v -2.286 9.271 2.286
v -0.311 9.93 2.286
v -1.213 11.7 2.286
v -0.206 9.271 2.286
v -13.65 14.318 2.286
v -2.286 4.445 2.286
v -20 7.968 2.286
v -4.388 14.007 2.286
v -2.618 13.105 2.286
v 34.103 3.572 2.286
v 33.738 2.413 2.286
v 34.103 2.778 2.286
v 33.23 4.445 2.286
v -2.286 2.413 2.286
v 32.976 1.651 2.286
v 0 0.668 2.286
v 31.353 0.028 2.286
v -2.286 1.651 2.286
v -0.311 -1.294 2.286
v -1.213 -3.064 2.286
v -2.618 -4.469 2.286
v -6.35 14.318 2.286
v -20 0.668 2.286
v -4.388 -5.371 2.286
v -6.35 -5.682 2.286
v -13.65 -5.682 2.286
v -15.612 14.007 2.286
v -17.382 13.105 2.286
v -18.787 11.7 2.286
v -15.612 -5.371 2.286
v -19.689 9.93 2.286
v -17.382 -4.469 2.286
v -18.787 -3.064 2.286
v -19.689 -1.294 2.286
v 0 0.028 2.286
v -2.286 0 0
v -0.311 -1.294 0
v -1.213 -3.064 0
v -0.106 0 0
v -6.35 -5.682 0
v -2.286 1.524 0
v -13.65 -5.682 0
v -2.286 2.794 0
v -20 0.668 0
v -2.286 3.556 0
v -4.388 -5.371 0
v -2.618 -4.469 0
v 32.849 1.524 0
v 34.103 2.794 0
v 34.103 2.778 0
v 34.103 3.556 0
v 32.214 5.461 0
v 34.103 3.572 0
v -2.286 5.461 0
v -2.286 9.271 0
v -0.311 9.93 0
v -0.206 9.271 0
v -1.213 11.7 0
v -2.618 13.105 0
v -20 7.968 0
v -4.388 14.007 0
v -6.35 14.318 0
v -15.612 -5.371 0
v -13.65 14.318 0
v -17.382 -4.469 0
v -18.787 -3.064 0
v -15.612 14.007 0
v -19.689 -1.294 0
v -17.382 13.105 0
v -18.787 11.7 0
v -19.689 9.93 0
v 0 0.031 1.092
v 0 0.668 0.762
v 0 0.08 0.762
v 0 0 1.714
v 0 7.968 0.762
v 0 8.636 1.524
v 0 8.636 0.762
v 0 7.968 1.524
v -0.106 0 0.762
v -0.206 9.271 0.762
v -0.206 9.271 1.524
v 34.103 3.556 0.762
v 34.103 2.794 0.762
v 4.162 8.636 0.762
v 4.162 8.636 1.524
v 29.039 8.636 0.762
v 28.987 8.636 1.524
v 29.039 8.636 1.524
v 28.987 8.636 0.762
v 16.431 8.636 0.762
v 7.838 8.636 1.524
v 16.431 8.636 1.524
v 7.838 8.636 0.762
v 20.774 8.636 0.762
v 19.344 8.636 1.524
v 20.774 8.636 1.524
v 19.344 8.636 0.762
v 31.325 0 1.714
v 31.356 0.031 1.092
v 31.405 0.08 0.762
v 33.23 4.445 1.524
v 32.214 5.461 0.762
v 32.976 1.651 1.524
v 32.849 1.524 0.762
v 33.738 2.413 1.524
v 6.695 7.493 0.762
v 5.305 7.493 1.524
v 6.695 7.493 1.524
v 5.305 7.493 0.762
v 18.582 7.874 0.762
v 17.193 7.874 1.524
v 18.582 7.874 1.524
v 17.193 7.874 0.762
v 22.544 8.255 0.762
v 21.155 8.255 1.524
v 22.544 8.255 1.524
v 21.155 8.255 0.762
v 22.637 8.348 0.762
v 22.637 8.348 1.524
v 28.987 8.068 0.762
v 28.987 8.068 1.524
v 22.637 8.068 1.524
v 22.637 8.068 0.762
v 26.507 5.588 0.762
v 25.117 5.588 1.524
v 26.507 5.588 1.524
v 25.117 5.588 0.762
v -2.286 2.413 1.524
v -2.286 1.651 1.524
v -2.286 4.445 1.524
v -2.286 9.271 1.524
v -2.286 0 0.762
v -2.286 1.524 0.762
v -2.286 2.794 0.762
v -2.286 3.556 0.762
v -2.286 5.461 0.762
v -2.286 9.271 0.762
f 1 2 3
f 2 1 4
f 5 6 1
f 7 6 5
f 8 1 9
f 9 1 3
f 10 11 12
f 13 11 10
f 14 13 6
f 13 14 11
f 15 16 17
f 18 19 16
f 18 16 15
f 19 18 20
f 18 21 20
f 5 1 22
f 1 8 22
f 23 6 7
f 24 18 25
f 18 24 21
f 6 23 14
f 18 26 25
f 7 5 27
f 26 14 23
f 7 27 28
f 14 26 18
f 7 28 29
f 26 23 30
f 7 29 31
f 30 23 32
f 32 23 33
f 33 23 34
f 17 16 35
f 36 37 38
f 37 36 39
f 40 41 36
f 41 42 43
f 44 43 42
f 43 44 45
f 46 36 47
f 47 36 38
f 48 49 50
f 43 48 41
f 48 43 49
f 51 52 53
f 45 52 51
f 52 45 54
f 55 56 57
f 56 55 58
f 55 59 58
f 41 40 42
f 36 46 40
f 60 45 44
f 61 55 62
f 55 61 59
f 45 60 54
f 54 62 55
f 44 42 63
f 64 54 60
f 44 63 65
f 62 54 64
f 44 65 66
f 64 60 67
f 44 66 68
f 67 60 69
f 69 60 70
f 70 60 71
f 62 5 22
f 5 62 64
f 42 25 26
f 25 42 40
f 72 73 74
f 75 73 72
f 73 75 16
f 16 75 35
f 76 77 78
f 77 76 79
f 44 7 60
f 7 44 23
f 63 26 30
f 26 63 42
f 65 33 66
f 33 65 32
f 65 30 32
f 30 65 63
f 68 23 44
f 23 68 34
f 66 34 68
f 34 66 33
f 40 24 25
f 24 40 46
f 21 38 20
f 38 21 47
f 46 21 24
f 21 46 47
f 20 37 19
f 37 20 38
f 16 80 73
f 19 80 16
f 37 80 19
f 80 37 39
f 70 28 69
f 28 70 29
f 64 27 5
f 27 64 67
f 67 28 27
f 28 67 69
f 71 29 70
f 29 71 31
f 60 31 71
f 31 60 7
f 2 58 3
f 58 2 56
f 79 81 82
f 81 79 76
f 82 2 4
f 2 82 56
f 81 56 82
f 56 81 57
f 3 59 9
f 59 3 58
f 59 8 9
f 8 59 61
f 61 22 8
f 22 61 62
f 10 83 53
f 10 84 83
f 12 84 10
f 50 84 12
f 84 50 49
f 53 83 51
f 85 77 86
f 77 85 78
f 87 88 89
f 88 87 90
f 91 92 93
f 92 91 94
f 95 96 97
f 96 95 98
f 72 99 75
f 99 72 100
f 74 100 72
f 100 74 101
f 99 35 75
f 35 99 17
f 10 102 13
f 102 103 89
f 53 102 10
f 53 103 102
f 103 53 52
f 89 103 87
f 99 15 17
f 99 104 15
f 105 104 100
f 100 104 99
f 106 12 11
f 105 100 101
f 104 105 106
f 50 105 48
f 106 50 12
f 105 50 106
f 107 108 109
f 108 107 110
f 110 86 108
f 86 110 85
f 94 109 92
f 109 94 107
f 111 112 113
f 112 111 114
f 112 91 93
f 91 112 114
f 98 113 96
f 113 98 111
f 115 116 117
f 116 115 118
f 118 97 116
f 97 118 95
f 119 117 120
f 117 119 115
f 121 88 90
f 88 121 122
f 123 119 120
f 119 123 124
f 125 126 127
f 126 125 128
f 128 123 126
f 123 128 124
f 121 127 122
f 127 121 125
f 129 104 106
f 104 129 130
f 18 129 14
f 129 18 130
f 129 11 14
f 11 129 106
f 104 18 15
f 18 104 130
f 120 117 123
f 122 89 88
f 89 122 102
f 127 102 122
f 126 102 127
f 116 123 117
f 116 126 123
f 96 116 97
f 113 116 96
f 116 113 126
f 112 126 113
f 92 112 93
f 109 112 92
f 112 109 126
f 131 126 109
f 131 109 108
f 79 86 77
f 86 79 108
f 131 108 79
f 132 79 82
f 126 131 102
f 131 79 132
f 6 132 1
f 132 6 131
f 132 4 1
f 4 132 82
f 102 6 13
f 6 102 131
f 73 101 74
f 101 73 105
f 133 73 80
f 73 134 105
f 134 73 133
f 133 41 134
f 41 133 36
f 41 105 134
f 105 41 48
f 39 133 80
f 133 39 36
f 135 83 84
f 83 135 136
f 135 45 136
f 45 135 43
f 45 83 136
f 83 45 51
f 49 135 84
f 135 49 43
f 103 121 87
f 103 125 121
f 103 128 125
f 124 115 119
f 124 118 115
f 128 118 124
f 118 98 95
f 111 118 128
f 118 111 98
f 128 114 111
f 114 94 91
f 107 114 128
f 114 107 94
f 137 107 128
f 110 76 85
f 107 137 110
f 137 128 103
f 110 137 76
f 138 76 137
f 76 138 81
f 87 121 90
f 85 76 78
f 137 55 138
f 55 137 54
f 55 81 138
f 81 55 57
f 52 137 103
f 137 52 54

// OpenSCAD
//Pin reference Table
//0 = .300"
//1 = .285
//2 = .270
//3 = .255"
//4 = .240"
//5 = .225"
//6 = .210"
//7 = .195"
//8 = .180"
//9 = .165" 
//10 = .150"
//cuts are ordered the same as key codes
//(cut at the handle of key)
cut_1 = 3; //[0:10]
cut_2 = 0; //[0:10]
cut_3 = 0; //[0:10]
cut_4 = 2; //[0:10]
cut_5 = 1; //[0:10]
cut_6 = 8; //[0:10]
//(cut at the tip of key)


function mm(i) = i*25.4;

module handle(size, r) {
  union() {
    translate([r, 0, 0]) cube([size[0]-2*r, size[1], size[2]]);
    translate([0, r, 0]) cube([size[0], size[1]-2*r, size[2]]);
    translate([r, r, 0]) cylinder(h=size[2], r=r);
    translate([size[0]-r, r, 0]) cylinder(h=size[2], r=r);
    translate([r, size[1]-r, 0]) cylinder(h=size[2], r=r);
    translate([size[0]-r, size[1]-r, 0]) cylinder(h=size[2], r=r);
  }
}

module bit() {
  w = mm(1/4);
  difference() {
    translate([-w/2, 0, 0]) cube([w, mm(1), w]);
    translate([-mm(7/256), 0, 0]) rotate([0, 0, 135]) cube([w, w, w]);
    translate([mm(7/256), 0, 0]) rotate([0, 0, -45]) cube([w, w, w]);
  }
}

// Lockwood gen6t 6 pin key.  The measurements are mostly guesses based on reverse
// engineering some keys I have and some publicly available information.
module gen6t(bits) {
  // You may need to adjust these to fit your specific printer settings
  thickness = mm(0.090);//Done
  length = 34.5; //Done
  width = mm(.340); //Done
  
  shoulder = 6;	//Done
  pin_spacing = mm(.156); //Done
  depth_inc = mm(.015); //Done
  
  // Handle size
  h_l = 20;
  h_w = 20;
  difference() {
    // blade and key handle
    union() {
      translate([-h_l, -h_w/2 + width/2, 0]) handle([h_l, h_w, thickness], mm(1/4));
      intersection() {
        // cut a little off the tip to avoid going too long
        cube([length - mm(1/64), width, thickness]);
        translate([0, mm(1/4), thickness*3/4]) rotate([0, 90, 0]) cylinder(h=length, r=mm(1/4), $fn=64);
      }
    }
    
    // chamfer the tip
    translate([length, mm(1/8), 0]) {
      rotate([0, 0, 45]) cube([10, 10, thickness]);
      rotate([0, 0, 225]) cube([10, 10, thickness]);
    }


    // cut the channels in the key.  designed more for printability than accuracy
    //Side A 
    translate([-thickness, mm(0.065), (thickness * 2)/3]) cube([length + thickness, mm(0.030), thickness/3]); 
    translate([-thickness, mm(0.175), (thickness * 2)/3]) cube([length + thickness, mm(0.190), thickness/3]);  
    //translate([-thickness, 4, thickness])rotate([-30,0,0]) cube([length + thickness, 2.5, thickness-0.75]);
    //translate([-thickness, 6, 0.75]) cube([length + thickness, 4, thickness-0.75]);
    
    //Side B
    translate([-thickness, 0, 0]) cube([length + thickness, mm(0.060), thickness/3]);
    translate([-thickness, mm(0.110), 0]) cube([length + thickness, mm(0.030), thickness/3]);  
    translate([-thickness, mm(0.215), 0]) cube([length + thickness, mm(0.15), thickness/3]); 
    
    // Do the actual bitting
    for (b = [0:5]) {
      translate([shoulder + b*pin_spacing, width - bits[b]*depth_inc, 0]) bit();
    }
  }
}

gen6t([cut_1,cut_2,cut_3,cut_4,cut_5,cut_6]);
